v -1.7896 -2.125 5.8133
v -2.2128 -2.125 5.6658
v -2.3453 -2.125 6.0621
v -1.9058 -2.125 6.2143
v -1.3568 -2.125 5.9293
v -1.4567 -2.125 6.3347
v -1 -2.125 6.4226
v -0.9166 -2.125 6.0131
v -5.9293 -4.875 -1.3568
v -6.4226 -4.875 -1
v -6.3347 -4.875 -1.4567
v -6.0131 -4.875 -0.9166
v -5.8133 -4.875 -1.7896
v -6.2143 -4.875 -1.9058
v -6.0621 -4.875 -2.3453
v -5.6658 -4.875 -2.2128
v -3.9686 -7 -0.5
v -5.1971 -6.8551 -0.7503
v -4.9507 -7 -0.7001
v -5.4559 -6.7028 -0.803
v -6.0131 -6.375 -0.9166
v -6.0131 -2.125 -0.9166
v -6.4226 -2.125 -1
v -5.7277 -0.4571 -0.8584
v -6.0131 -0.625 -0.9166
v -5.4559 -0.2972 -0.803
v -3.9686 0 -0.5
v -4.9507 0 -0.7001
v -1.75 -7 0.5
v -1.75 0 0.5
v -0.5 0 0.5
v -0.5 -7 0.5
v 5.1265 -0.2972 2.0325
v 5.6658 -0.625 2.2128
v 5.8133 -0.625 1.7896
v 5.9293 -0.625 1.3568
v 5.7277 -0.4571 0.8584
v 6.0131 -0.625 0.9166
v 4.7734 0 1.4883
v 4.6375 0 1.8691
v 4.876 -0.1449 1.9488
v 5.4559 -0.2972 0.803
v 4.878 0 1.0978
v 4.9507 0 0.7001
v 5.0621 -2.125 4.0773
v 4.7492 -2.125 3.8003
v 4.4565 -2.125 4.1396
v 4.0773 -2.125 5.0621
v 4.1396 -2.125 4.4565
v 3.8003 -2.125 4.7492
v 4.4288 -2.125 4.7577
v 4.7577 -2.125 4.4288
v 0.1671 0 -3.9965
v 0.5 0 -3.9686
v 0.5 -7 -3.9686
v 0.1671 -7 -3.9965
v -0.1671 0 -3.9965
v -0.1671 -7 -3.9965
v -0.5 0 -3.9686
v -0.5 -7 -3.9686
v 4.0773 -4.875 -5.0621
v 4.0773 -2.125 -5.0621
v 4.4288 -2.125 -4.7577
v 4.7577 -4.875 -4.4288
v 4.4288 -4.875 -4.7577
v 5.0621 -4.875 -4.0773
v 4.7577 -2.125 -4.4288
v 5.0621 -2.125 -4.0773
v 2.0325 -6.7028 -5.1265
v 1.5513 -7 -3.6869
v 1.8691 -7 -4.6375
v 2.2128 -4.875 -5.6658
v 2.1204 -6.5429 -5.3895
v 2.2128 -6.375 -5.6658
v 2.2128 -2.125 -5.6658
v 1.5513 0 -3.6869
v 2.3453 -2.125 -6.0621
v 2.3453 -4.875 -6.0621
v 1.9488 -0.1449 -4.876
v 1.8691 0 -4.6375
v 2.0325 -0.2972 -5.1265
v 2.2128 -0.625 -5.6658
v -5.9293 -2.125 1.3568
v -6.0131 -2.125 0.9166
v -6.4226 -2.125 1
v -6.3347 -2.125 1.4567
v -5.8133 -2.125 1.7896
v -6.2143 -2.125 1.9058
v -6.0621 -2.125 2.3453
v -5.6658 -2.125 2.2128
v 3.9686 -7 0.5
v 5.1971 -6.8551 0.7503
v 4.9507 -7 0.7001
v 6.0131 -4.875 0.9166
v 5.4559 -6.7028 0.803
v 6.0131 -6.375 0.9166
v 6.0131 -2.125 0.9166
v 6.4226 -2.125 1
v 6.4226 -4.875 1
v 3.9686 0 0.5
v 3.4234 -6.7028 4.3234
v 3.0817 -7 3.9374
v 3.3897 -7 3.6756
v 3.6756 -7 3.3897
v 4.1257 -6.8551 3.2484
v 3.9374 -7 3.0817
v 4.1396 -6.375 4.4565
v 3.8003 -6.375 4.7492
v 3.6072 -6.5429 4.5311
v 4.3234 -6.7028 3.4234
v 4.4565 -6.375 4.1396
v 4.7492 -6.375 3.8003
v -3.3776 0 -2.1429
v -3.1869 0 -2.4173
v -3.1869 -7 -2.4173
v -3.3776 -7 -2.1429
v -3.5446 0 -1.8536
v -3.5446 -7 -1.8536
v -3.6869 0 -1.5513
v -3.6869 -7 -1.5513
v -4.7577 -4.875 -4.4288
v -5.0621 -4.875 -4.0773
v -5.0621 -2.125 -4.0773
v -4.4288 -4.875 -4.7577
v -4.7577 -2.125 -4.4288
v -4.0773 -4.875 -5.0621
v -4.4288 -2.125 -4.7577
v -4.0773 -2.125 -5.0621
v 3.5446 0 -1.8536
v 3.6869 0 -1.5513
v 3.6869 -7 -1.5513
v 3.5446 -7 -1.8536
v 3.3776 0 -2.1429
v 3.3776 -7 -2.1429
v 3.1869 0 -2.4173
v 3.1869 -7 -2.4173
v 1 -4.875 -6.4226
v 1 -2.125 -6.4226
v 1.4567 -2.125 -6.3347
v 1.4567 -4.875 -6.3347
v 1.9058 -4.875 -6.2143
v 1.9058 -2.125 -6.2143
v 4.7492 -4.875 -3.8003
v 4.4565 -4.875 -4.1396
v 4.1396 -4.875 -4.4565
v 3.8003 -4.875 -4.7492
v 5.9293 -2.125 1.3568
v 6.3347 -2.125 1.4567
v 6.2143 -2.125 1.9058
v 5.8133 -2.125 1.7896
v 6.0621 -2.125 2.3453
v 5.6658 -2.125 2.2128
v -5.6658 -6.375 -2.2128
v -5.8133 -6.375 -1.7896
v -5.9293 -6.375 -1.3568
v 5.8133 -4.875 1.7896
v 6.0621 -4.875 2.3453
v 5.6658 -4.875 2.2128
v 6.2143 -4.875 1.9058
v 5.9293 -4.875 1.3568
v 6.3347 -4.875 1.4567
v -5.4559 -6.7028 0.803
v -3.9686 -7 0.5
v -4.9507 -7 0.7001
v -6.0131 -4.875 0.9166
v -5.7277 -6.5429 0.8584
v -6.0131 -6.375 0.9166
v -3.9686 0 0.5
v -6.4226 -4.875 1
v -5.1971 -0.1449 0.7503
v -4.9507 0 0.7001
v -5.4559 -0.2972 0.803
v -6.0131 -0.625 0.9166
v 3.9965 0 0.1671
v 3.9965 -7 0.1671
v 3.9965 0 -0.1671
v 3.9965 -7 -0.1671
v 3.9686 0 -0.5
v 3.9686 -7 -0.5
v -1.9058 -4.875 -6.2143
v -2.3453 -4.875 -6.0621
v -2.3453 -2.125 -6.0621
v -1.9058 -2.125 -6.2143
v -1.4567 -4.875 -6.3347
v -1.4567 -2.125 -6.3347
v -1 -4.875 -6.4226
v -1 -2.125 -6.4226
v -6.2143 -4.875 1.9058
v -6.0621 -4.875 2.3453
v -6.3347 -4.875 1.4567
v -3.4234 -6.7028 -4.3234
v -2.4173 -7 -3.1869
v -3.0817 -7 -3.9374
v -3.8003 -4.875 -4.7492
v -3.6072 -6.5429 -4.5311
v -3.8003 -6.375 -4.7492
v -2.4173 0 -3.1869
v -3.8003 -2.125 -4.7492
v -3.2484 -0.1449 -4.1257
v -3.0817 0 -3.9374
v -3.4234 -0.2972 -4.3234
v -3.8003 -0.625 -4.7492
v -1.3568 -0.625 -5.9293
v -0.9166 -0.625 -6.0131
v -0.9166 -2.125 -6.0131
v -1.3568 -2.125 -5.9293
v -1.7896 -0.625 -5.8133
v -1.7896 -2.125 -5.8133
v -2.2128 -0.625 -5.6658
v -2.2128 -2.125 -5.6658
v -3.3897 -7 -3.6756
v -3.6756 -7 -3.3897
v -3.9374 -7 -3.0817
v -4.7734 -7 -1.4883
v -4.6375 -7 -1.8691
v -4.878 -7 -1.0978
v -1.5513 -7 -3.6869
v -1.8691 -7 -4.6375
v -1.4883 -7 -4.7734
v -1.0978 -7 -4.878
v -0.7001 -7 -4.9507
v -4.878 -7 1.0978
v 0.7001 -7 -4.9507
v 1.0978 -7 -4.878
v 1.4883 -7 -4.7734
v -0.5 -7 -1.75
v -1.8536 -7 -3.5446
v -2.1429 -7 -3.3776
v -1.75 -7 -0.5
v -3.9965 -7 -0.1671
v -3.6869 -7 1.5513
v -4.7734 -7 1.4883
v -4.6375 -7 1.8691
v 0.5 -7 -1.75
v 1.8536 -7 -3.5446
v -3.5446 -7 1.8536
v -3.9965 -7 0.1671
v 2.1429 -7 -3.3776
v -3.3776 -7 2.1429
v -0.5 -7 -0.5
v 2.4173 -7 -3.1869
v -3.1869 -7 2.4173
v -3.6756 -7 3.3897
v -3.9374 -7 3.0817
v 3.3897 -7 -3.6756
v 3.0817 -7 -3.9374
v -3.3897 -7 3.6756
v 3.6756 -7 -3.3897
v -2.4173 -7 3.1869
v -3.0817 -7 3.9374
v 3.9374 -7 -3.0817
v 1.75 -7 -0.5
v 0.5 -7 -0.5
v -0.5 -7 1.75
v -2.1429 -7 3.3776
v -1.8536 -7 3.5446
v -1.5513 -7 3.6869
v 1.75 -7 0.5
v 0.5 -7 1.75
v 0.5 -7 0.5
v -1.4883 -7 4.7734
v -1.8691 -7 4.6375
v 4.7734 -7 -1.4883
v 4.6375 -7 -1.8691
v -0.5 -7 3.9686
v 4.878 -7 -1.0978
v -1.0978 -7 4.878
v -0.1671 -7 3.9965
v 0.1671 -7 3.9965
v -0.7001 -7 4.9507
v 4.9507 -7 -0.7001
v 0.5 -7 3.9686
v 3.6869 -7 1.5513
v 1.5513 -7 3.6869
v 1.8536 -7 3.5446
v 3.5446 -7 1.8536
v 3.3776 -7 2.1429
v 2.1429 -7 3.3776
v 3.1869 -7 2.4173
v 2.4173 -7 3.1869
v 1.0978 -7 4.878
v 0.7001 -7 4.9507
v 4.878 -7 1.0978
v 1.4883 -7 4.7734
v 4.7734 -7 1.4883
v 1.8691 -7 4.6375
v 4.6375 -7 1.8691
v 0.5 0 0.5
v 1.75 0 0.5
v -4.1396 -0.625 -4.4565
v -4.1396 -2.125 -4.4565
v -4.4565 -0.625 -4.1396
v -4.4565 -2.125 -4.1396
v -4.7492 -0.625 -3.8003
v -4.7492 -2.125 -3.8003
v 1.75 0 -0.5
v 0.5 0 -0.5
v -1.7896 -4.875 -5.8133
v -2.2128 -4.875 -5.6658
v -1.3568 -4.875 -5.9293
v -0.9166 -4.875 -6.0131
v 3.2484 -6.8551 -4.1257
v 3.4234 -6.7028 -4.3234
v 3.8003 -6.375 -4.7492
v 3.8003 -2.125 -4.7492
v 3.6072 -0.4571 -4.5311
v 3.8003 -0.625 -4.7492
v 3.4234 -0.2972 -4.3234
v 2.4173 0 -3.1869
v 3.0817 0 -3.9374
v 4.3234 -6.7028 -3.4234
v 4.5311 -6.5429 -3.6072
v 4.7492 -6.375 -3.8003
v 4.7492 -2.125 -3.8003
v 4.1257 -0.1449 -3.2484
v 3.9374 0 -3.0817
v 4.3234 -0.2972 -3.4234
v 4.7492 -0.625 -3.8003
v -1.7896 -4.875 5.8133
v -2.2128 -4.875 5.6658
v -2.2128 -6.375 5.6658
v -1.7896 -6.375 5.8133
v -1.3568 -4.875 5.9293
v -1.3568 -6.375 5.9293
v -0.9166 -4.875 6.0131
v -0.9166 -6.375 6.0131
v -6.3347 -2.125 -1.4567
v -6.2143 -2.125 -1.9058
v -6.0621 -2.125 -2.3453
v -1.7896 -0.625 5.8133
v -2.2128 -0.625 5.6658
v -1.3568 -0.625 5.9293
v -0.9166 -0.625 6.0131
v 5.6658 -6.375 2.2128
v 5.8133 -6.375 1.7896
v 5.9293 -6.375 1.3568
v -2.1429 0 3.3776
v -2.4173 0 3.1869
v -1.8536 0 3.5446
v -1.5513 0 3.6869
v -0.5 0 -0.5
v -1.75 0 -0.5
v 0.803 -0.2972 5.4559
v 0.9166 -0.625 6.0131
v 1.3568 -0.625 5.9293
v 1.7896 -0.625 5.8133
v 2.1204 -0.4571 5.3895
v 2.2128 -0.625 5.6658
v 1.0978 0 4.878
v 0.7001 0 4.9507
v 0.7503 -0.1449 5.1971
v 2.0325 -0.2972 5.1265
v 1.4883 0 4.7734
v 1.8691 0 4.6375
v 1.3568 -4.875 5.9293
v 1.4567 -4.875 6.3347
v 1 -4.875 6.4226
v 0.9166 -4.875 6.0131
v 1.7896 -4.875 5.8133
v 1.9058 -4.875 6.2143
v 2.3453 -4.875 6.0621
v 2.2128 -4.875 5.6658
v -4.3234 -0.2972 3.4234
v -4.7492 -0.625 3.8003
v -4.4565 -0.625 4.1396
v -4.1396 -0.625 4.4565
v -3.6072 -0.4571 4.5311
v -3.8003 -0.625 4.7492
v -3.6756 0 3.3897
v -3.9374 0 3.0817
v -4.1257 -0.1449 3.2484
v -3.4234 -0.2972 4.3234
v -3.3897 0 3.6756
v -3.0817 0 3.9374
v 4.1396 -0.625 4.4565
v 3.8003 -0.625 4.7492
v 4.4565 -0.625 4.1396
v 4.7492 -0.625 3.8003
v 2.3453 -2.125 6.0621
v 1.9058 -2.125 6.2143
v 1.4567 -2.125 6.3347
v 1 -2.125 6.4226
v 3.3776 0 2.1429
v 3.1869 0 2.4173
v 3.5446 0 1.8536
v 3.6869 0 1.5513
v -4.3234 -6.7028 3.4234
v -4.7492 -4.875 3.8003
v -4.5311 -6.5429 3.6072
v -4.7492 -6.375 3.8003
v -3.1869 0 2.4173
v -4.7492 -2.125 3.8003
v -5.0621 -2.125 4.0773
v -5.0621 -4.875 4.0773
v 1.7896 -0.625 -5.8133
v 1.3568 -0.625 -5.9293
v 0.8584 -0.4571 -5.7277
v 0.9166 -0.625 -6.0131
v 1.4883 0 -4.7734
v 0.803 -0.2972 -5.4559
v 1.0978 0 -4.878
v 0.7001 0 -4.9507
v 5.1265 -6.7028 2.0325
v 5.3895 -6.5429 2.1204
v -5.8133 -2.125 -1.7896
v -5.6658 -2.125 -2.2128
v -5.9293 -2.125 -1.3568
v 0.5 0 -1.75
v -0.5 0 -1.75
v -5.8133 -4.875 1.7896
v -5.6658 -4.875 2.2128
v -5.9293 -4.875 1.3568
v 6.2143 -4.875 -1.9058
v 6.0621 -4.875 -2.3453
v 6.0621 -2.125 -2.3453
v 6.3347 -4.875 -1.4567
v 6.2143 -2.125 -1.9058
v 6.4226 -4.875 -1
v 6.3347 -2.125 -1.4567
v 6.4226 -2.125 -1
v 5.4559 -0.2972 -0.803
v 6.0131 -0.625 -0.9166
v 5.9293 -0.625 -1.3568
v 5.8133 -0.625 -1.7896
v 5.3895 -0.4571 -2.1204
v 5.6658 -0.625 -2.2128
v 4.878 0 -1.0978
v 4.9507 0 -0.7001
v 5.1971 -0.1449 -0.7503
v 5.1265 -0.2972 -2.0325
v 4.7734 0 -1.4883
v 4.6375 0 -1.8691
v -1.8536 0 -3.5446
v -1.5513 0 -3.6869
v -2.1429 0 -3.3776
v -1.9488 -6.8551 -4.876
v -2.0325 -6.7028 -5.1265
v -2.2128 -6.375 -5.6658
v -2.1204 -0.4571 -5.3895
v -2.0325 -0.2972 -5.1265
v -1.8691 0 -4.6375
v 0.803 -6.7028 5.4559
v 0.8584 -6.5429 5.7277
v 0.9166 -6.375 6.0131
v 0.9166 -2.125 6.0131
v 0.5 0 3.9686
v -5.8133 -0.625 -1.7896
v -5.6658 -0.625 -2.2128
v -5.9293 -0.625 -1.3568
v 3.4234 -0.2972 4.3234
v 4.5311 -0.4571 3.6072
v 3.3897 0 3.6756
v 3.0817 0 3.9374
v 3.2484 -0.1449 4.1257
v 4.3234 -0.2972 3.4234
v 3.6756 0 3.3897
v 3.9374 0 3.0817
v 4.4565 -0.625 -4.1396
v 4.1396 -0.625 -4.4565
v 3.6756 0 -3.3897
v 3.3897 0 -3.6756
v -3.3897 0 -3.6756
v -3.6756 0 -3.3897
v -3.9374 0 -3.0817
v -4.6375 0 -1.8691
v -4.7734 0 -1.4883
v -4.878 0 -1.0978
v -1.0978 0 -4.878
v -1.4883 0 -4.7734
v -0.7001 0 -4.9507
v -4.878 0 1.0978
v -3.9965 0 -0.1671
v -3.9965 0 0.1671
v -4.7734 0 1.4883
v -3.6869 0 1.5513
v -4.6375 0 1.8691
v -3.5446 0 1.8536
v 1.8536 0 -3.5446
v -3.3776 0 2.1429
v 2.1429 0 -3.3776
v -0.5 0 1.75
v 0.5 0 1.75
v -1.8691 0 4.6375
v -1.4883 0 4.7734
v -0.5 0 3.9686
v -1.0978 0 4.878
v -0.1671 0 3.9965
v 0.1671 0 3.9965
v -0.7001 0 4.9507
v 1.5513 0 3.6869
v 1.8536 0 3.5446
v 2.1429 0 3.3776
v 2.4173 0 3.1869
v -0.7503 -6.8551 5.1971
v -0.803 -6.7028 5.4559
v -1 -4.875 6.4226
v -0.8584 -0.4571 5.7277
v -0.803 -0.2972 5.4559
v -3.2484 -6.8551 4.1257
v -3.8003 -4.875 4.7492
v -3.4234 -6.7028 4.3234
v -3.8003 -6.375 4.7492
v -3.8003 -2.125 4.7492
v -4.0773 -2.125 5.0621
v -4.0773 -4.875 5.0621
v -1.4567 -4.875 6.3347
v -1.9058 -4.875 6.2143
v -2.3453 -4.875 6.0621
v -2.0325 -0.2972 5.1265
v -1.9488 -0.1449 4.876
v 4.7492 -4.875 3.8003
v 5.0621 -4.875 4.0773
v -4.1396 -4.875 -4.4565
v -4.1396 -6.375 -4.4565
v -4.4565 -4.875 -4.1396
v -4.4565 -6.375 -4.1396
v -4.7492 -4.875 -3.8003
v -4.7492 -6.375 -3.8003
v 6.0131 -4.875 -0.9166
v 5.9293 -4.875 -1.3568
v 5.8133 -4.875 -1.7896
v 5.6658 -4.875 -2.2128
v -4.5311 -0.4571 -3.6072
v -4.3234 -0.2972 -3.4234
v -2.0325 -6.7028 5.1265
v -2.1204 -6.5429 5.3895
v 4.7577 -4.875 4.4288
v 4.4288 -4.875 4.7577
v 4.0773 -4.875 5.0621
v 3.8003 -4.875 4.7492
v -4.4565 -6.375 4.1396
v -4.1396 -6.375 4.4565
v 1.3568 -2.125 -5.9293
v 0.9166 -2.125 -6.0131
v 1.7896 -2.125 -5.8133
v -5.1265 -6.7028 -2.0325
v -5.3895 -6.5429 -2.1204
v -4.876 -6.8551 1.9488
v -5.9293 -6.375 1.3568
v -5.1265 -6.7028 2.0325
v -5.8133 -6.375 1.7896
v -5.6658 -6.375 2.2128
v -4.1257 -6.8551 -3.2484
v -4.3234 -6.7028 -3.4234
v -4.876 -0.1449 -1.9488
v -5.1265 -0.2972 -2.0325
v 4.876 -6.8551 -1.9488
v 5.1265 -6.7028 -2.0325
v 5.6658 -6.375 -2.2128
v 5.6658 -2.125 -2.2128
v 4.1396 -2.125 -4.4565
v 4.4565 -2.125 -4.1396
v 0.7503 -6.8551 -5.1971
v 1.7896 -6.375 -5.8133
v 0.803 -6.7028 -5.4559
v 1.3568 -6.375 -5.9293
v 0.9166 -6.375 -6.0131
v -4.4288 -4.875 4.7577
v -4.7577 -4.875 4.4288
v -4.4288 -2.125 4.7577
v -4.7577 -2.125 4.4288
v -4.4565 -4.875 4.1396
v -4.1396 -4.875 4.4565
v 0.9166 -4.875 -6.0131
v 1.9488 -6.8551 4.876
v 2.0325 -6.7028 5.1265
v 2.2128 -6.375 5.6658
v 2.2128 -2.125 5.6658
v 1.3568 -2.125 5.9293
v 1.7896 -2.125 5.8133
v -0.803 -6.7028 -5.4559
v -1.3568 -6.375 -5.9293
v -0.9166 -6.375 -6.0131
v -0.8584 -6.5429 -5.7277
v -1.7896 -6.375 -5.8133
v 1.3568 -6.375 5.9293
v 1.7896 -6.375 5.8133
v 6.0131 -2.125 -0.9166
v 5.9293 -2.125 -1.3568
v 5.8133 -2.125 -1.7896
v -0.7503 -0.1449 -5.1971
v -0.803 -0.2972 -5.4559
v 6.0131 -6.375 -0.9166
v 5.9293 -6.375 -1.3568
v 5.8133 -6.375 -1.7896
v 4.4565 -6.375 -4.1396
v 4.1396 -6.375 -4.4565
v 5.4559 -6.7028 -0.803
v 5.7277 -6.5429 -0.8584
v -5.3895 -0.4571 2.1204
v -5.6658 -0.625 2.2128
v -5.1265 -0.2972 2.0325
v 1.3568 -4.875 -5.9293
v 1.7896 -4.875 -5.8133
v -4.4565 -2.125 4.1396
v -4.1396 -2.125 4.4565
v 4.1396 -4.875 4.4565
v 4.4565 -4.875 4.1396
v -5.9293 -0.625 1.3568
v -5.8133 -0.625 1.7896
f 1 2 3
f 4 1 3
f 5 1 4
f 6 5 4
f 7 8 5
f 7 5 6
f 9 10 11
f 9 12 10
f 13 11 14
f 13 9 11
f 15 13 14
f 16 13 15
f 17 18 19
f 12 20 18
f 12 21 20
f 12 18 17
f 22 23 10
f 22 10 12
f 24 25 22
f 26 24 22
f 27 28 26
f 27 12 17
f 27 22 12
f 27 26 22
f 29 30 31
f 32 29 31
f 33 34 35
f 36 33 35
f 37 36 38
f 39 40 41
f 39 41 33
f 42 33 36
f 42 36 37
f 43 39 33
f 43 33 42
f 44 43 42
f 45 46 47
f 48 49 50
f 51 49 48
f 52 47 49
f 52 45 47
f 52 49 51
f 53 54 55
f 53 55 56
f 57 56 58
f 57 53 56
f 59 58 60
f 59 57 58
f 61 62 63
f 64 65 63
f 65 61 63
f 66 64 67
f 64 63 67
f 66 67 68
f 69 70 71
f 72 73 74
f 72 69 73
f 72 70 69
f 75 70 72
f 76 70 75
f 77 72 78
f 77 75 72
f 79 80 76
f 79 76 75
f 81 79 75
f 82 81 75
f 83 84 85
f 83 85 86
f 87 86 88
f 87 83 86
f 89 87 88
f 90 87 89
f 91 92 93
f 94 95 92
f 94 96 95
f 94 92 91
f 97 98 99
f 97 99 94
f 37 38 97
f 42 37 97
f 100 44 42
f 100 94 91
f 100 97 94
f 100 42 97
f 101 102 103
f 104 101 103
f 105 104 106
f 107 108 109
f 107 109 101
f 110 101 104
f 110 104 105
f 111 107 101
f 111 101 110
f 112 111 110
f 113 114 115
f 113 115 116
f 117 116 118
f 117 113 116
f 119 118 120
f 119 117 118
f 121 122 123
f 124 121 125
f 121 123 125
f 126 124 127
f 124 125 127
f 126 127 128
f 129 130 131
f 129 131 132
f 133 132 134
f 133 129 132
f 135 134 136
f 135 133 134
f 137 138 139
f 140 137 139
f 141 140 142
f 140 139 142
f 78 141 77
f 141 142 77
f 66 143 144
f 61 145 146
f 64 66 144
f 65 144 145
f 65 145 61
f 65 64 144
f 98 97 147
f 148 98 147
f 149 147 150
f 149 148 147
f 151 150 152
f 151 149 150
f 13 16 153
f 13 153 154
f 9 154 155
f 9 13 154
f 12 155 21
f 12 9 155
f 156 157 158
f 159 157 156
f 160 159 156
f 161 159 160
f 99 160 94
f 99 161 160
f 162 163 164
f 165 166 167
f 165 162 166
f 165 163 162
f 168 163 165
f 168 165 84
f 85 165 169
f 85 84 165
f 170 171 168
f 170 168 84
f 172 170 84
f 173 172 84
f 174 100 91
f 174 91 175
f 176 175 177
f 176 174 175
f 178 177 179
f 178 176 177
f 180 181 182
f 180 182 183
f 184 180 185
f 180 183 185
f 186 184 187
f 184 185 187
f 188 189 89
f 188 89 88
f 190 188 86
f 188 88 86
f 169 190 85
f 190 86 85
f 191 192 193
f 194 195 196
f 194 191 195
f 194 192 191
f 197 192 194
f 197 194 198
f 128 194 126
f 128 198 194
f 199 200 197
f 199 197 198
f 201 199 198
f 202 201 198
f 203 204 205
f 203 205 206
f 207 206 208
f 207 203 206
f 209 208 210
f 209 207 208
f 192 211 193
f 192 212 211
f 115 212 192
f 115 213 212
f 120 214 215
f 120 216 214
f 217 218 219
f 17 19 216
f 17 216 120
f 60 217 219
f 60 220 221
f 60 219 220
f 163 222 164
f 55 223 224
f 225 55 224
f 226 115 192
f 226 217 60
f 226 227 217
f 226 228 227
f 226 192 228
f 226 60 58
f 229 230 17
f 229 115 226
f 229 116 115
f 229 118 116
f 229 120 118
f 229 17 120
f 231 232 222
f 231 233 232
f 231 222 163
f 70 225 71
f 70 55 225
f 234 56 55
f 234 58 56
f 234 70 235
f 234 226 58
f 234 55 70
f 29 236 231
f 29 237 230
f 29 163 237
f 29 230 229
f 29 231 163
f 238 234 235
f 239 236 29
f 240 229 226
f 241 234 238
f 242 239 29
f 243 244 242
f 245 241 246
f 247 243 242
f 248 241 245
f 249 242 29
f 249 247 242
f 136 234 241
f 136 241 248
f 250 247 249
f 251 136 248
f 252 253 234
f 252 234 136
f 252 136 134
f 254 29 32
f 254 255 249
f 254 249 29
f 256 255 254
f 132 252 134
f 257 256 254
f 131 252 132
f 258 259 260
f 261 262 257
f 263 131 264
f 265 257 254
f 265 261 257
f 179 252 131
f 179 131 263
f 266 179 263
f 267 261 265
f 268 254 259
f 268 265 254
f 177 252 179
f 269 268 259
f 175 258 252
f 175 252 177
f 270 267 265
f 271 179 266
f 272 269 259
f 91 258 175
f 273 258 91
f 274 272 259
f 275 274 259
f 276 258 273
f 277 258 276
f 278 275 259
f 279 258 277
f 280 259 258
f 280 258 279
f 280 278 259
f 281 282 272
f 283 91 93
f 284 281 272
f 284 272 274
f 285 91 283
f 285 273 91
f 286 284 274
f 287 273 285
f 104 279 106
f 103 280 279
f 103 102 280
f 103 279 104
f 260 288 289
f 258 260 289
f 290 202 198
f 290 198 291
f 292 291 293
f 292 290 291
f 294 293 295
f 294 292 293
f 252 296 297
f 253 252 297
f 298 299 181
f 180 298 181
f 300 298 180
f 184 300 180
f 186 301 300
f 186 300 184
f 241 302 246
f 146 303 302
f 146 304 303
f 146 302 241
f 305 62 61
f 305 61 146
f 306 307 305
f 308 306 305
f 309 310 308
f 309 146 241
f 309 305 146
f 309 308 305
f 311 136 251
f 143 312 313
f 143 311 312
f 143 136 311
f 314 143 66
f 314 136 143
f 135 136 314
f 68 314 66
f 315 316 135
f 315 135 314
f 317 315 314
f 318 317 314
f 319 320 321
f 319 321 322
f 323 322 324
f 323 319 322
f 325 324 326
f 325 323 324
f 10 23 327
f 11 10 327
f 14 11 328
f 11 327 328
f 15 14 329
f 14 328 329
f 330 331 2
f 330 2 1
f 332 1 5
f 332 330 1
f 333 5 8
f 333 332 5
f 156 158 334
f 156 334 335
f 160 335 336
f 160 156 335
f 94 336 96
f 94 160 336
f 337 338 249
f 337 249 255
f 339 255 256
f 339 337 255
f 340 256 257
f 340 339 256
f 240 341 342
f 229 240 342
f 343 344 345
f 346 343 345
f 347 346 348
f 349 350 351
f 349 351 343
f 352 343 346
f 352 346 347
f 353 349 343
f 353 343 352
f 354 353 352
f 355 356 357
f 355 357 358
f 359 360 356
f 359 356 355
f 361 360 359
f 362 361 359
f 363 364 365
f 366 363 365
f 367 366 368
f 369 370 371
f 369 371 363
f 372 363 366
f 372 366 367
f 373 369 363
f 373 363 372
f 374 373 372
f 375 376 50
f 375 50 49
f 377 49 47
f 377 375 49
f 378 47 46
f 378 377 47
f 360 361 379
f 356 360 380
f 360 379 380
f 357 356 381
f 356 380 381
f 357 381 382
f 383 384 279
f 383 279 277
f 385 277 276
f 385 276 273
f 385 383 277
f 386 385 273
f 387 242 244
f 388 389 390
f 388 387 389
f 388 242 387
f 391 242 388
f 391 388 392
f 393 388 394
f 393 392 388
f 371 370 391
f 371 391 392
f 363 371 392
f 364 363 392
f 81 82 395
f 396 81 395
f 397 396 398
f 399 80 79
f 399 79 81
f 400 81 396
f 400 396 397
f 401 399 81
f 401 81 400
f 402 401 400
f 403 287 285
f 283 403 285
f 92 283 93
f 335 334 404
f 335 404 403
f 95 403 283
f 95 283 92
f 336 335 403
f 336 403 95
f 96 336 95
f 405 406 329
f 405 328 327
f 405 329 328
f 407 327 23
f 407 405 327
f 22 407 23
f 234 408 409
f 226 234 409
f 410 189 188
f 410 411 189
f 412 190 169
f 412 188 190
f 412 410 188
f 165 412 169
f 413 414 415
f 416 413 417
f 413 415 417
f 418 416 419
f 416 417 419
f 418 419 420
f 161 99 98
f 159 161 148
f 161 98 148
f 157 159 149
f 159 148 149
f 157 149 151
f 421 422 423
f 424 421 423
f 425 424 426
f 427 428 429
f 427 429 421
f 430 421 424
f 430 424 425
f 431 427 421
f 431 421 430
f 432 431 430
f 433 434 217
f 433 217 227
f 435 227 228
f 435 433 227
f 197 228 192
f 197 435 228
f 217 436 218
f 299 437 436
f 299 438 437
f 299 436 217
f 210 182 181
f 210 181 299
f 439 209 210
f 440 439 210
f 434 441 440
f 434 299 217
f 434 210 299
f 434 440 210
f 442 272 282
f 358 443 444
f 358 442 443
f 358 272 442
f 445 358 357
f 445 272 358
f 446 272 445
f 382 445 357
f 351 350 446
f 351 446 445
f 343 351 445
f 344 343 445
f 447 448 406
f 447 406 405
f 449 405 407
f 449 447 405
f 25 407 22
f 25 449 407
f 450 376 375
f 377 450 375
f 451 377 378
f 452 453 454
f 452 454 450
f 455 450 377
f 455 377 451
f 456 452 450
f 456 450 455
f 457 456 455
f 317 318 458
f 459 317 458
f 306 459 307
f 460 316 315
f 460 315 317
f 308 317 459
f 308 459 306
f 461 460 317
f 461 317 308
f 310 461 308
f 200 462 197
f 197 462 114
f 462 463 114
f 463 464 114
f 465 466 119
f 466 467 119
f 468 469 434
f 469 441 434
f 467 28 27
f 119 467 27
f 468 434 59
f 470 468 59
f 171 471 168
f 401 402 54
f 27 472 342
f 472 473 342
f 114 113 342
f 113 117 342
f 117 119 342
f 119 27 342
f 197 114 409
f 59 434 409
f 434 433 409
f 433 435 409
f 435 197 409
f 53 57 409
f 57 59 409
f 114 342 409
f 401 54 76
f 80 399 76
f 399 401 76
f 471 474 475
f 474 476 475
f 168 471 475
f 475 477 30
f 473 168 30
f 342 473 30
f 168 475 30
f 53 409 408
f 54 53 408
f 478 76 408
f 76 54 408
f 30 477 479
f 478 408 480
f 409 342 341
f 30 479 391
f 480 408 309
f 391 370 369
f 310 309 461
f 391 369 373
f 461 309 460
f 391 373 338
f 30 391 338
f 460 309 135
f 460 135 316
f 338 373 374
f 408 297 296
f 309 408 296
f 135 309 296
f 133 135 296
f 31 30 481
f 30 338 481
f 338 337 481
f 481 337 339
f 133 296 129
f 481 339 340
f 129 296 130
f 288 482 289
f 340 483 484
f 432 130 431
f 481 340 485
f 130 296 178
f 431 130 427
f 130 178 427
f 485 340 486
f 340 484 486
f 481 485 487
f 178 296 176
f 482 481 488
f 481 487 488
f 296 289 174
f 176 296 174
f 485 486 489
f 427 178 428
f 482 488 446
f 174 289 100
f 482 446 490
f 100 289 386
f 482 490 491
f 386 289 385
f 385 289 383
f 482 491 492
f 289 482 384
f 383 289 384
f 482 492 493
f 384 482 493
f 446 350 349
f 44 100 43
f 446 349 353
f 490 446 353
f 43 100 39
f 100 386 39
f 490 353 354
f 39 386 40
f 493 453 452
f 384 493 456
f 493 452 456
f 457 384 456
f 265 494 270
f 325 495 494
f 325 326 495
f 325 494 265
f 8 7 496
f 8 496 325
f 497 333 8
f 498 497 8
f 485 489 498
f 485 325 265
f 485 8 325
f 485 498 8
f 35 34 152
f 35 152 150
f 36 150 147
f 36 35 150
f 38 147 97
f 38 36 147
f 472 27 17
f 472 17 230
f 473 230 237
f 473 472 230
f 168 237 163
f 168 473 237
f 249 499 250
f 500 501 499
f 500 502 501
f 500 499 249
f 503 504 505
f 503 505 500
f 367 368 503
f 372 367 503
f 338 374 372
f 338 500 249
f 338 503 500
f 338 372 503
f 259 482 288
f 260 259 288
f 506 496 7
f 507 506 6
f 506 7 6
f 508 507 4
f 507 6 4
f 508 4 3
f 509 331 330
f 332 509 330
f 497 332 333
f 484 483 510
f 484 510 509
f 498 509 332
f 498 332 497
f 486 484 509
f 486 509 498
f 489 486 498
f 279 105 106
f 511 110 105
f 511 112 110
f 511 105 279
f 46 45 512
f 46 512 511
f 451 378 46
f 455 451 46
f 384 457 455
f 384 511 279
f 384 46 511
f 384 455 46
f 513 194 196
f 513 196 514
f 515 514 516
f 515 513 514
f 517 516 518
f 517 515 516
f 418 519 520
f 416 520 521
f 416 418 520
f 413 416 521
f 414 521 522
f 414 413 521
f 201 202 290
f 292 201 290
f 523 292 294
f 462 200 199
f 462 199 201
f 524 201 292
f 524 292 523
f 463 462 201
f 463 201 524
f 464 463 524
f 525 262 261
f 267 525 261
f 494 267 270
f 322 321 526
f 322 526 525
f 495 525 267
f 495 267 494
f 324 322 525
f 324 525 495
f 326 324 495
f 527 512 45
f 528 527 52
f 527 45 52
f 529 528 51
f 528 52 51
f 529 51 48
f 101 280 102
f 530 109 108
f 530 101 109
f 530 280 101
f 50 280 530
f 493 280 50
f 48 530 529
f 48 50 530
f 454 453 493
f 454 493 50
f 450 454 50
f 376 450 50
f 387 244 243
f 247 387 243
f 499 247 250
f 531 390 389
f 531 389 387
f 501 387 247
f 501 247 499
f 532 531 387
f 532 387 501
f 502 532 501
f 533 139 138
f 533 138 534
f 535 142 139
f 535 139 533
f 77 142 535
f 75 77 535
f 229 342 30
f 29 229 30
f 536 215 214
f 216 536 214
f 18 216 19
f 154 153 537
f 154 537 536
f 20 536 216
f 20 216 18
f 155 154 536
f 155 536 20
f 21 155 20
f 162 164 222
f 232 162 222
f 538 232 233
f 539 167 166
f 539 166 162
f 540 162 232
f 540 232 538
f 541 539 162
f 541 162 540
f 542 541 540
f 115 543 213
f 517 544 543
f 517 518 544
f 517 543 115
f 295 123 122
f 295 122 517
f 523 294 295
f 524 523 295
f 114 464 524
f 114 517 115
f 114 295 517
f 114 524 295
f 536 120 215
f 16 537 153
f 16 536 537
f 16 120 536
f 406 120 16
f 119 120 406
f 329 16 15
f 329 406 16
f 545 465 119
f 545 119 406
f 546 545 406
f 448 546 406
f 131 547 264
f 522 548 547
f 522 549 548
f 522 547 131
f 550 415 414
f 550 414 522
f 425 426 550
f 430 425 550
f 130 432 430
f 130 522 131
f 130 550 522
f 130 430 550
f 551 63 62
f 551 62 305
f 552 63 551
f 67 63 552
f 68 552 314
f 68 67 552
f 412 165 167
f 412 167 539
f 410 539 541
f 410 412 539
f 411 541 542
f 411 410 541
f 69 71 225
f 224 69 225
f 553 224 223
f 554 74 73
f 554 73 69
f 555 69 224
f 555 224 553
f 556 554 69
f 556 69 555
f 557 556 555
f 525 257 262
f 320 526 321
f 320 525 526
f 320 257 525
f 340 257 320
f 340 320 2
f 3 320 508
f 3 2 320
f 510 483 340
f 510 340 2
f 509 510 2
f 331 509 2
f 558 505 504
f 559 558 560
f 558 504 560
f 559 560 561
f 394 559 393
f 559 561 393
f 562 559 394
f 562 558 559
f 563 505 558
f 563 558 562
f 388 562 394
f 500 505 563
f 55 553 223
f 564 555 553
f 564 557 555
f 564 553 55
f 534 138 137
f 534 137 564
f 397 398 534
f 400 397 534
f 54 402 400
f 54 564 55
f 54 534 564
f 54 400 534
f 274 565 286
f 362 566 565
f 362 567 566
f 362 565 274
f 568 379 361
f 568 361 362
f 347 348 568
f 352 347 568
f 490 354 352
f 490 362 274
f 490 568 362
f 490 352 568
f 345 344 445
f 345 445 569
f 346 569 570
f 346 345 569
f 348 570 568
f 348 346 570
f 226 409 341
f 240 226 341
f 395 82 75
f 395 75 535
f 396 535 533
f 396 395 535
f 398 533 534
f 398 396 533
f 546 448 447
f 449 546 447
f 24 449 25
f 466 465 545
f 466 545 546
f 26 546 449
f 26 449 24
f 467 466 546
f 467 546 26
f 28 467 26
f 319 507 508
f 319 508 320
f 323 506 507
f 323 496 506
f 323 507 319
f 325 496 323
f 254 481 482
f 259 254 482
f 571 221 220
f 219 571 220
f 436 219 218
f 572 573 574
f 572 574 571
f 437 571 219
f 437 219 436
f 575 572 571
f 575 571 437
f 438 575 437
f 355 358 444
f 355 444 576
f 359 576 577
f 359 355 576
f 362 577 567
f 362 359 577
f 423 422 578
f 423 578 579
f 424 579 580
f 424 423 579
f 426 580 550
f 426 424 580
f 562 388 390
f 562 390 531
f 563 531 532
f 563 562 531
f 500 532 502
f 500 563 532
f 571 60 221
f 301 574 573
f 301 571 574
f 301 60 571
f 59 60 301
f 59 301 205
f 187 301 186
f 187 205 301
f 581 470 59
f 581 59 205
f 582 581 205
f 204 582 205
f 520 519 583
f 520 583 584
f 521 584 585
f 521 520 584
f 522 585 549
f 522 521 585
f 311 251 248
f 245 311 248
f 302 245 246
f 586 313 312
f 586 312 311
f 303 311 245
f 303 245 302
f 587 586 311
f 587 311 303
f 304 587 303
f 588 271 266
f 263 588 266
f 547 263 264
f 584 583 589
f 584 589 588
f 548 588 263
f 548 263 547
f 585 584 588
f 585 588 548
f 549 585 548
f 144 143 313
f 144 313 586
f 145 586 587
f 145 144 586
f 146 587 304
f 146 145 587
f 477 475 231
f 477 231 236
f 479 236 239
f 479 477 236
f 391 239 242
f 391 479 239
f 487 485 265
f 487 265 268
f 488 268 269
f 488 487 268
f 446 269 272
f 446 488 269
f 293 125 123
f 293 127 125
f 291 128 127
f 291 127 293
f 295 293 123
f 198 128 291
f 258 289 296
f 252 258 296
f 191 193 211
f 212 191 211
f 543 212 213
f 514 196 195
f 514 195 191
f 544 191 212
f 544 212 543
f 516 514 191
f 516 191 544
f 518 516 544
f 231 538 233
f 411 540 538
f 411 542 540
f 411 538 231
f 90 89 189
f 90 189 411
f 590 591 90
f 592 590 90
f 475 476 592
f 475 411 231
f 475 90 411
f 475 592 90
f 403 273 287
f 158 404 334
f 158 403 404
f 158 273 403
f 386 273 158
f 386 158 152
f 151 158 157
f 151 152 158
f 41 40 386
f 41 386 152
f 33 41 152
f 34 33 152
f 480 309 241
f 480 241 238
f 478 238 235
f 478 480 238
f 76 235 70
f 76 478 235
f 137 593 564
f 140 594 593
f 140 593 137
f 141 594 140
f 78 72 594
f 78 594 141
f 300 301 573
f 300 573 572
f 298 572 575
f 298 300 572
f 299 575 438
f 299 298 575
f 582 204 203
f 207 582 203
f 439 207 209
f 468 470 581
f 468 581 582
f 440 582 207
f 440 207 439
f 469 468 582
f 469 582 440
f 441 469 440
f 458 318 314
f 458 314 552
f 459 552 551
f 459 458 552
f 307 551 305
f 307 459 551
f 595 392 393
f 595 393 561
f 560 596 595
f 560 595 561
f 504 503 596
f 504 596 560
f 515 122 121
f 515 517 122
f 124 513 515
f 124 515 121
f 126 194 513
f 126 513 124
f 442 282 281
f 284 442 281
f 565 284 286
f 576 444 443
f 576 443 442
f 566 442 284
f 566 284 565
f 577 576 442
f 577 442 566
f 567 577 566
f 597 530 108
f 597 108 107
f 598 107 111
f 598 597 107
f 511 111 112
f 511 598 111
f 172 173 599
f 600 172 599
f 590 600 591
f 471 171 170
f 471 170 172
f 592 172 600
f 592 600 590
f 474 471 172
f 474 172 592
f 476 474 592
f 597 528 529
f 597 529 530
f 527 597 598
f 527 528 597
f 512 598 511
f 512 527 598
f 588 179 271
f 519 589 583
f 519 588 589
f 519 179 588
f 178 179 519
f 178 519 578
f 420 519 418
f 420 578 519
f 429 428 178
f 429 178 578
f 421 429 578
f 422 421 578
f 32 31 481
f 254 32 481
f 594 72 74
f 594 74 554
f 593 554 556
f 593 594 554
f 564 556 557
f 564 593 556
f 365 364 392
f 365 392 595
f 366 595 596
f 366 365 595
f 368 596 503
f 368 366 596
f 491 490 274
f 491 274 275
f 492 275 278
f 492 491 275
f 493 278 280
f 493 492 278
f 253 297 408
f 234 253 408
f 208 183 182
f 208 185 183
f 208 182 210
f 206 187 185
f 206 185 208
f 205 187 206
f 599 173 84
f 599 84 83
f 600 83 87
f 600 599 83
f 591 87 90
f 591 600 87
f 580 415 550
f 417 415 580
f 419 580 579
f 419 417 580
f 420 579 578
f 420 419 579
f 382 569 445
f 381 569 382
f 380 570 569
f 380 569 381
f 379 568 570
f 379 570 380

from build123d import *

# Parameters (mm, degrees)
F0_R            = 6.5
F1_DEPTH        = 7
F5_DEPTH        = 7.001
F5_COPIES_COUNT = 12


# Not quite as in the source:
# - a pattern or mirror of a feature is missing from the dataset's text; its kind, count and spacing are read off the source's solid


with BuildPart() as f1:
    # F0 (on Front) → F1 (new body)
    with BuildSketch(Plane.XZ):
        Circle(F0_R)
        Polygon((-1.75, 0.5), (-0.5, 0.5), (-0.5, 1.75), (0.5, 1.75), (0.5, 0.5), (1.75, 0.5), (1.75, -0.5), (0.5, -0.5), (0.5, -1.75), (-0.5, -1.75), (-0.5, -0.5), (-1.75, -0.5), align=None, mode=Mode.SUBTRACT)
    extrude(amount=F1_DEPTH)

    # F2 (on Right) → F3 (revolve, cut)
    with BuildSketch(Plane.YZ):
        Polygon((-7, 8), (-7, 5), (-6.375, 6.0825317547), (-4.875, 6.0825317547), (-4.875, 6.5), (-2.125, 6.5), (-2.125, 6.0825317547), (-0.625, 6.0825317547), (0, 5), (0, 8), align=None)
    revolve(axis=Axis((0, 2.603987056, 0), (0, 1, 0)), mode=Mode.SUBTRACT)

    # F4 (on Front) → F5 (cut, through all)
    with BuildSketch(Plane.XZ):
        with BuildLine():
            Line((0.5, 3.9686269666), (1, 6.4226162893))
            ThreePointArc((1, 6.4226162893), (0, 6.5), (-1, 6.4226162893))
            Line((-1, 6.4226162893), (-0.5, 3.9686269666))
            ThreePointArc((-0.5, 3.9686269666), (0, 4), (0.5, 3.9686269666))
        make_face()
    f5 = extrude(amount=F5_DEPTH, mode=Mode.SUBTRACT)

    # F5_copies: F5 ×12 about axis
    f5_copies_axis = Axis((0, 0, 0), (0, 1, 0))
    for i in range(1, F5_COPIES_COUNT):
        add(f5.rotate(f5_copies_axis, i * 360 / F5_COPIES_COUNT), mode=Mode.SUBTRACT)


solid = f1.part
